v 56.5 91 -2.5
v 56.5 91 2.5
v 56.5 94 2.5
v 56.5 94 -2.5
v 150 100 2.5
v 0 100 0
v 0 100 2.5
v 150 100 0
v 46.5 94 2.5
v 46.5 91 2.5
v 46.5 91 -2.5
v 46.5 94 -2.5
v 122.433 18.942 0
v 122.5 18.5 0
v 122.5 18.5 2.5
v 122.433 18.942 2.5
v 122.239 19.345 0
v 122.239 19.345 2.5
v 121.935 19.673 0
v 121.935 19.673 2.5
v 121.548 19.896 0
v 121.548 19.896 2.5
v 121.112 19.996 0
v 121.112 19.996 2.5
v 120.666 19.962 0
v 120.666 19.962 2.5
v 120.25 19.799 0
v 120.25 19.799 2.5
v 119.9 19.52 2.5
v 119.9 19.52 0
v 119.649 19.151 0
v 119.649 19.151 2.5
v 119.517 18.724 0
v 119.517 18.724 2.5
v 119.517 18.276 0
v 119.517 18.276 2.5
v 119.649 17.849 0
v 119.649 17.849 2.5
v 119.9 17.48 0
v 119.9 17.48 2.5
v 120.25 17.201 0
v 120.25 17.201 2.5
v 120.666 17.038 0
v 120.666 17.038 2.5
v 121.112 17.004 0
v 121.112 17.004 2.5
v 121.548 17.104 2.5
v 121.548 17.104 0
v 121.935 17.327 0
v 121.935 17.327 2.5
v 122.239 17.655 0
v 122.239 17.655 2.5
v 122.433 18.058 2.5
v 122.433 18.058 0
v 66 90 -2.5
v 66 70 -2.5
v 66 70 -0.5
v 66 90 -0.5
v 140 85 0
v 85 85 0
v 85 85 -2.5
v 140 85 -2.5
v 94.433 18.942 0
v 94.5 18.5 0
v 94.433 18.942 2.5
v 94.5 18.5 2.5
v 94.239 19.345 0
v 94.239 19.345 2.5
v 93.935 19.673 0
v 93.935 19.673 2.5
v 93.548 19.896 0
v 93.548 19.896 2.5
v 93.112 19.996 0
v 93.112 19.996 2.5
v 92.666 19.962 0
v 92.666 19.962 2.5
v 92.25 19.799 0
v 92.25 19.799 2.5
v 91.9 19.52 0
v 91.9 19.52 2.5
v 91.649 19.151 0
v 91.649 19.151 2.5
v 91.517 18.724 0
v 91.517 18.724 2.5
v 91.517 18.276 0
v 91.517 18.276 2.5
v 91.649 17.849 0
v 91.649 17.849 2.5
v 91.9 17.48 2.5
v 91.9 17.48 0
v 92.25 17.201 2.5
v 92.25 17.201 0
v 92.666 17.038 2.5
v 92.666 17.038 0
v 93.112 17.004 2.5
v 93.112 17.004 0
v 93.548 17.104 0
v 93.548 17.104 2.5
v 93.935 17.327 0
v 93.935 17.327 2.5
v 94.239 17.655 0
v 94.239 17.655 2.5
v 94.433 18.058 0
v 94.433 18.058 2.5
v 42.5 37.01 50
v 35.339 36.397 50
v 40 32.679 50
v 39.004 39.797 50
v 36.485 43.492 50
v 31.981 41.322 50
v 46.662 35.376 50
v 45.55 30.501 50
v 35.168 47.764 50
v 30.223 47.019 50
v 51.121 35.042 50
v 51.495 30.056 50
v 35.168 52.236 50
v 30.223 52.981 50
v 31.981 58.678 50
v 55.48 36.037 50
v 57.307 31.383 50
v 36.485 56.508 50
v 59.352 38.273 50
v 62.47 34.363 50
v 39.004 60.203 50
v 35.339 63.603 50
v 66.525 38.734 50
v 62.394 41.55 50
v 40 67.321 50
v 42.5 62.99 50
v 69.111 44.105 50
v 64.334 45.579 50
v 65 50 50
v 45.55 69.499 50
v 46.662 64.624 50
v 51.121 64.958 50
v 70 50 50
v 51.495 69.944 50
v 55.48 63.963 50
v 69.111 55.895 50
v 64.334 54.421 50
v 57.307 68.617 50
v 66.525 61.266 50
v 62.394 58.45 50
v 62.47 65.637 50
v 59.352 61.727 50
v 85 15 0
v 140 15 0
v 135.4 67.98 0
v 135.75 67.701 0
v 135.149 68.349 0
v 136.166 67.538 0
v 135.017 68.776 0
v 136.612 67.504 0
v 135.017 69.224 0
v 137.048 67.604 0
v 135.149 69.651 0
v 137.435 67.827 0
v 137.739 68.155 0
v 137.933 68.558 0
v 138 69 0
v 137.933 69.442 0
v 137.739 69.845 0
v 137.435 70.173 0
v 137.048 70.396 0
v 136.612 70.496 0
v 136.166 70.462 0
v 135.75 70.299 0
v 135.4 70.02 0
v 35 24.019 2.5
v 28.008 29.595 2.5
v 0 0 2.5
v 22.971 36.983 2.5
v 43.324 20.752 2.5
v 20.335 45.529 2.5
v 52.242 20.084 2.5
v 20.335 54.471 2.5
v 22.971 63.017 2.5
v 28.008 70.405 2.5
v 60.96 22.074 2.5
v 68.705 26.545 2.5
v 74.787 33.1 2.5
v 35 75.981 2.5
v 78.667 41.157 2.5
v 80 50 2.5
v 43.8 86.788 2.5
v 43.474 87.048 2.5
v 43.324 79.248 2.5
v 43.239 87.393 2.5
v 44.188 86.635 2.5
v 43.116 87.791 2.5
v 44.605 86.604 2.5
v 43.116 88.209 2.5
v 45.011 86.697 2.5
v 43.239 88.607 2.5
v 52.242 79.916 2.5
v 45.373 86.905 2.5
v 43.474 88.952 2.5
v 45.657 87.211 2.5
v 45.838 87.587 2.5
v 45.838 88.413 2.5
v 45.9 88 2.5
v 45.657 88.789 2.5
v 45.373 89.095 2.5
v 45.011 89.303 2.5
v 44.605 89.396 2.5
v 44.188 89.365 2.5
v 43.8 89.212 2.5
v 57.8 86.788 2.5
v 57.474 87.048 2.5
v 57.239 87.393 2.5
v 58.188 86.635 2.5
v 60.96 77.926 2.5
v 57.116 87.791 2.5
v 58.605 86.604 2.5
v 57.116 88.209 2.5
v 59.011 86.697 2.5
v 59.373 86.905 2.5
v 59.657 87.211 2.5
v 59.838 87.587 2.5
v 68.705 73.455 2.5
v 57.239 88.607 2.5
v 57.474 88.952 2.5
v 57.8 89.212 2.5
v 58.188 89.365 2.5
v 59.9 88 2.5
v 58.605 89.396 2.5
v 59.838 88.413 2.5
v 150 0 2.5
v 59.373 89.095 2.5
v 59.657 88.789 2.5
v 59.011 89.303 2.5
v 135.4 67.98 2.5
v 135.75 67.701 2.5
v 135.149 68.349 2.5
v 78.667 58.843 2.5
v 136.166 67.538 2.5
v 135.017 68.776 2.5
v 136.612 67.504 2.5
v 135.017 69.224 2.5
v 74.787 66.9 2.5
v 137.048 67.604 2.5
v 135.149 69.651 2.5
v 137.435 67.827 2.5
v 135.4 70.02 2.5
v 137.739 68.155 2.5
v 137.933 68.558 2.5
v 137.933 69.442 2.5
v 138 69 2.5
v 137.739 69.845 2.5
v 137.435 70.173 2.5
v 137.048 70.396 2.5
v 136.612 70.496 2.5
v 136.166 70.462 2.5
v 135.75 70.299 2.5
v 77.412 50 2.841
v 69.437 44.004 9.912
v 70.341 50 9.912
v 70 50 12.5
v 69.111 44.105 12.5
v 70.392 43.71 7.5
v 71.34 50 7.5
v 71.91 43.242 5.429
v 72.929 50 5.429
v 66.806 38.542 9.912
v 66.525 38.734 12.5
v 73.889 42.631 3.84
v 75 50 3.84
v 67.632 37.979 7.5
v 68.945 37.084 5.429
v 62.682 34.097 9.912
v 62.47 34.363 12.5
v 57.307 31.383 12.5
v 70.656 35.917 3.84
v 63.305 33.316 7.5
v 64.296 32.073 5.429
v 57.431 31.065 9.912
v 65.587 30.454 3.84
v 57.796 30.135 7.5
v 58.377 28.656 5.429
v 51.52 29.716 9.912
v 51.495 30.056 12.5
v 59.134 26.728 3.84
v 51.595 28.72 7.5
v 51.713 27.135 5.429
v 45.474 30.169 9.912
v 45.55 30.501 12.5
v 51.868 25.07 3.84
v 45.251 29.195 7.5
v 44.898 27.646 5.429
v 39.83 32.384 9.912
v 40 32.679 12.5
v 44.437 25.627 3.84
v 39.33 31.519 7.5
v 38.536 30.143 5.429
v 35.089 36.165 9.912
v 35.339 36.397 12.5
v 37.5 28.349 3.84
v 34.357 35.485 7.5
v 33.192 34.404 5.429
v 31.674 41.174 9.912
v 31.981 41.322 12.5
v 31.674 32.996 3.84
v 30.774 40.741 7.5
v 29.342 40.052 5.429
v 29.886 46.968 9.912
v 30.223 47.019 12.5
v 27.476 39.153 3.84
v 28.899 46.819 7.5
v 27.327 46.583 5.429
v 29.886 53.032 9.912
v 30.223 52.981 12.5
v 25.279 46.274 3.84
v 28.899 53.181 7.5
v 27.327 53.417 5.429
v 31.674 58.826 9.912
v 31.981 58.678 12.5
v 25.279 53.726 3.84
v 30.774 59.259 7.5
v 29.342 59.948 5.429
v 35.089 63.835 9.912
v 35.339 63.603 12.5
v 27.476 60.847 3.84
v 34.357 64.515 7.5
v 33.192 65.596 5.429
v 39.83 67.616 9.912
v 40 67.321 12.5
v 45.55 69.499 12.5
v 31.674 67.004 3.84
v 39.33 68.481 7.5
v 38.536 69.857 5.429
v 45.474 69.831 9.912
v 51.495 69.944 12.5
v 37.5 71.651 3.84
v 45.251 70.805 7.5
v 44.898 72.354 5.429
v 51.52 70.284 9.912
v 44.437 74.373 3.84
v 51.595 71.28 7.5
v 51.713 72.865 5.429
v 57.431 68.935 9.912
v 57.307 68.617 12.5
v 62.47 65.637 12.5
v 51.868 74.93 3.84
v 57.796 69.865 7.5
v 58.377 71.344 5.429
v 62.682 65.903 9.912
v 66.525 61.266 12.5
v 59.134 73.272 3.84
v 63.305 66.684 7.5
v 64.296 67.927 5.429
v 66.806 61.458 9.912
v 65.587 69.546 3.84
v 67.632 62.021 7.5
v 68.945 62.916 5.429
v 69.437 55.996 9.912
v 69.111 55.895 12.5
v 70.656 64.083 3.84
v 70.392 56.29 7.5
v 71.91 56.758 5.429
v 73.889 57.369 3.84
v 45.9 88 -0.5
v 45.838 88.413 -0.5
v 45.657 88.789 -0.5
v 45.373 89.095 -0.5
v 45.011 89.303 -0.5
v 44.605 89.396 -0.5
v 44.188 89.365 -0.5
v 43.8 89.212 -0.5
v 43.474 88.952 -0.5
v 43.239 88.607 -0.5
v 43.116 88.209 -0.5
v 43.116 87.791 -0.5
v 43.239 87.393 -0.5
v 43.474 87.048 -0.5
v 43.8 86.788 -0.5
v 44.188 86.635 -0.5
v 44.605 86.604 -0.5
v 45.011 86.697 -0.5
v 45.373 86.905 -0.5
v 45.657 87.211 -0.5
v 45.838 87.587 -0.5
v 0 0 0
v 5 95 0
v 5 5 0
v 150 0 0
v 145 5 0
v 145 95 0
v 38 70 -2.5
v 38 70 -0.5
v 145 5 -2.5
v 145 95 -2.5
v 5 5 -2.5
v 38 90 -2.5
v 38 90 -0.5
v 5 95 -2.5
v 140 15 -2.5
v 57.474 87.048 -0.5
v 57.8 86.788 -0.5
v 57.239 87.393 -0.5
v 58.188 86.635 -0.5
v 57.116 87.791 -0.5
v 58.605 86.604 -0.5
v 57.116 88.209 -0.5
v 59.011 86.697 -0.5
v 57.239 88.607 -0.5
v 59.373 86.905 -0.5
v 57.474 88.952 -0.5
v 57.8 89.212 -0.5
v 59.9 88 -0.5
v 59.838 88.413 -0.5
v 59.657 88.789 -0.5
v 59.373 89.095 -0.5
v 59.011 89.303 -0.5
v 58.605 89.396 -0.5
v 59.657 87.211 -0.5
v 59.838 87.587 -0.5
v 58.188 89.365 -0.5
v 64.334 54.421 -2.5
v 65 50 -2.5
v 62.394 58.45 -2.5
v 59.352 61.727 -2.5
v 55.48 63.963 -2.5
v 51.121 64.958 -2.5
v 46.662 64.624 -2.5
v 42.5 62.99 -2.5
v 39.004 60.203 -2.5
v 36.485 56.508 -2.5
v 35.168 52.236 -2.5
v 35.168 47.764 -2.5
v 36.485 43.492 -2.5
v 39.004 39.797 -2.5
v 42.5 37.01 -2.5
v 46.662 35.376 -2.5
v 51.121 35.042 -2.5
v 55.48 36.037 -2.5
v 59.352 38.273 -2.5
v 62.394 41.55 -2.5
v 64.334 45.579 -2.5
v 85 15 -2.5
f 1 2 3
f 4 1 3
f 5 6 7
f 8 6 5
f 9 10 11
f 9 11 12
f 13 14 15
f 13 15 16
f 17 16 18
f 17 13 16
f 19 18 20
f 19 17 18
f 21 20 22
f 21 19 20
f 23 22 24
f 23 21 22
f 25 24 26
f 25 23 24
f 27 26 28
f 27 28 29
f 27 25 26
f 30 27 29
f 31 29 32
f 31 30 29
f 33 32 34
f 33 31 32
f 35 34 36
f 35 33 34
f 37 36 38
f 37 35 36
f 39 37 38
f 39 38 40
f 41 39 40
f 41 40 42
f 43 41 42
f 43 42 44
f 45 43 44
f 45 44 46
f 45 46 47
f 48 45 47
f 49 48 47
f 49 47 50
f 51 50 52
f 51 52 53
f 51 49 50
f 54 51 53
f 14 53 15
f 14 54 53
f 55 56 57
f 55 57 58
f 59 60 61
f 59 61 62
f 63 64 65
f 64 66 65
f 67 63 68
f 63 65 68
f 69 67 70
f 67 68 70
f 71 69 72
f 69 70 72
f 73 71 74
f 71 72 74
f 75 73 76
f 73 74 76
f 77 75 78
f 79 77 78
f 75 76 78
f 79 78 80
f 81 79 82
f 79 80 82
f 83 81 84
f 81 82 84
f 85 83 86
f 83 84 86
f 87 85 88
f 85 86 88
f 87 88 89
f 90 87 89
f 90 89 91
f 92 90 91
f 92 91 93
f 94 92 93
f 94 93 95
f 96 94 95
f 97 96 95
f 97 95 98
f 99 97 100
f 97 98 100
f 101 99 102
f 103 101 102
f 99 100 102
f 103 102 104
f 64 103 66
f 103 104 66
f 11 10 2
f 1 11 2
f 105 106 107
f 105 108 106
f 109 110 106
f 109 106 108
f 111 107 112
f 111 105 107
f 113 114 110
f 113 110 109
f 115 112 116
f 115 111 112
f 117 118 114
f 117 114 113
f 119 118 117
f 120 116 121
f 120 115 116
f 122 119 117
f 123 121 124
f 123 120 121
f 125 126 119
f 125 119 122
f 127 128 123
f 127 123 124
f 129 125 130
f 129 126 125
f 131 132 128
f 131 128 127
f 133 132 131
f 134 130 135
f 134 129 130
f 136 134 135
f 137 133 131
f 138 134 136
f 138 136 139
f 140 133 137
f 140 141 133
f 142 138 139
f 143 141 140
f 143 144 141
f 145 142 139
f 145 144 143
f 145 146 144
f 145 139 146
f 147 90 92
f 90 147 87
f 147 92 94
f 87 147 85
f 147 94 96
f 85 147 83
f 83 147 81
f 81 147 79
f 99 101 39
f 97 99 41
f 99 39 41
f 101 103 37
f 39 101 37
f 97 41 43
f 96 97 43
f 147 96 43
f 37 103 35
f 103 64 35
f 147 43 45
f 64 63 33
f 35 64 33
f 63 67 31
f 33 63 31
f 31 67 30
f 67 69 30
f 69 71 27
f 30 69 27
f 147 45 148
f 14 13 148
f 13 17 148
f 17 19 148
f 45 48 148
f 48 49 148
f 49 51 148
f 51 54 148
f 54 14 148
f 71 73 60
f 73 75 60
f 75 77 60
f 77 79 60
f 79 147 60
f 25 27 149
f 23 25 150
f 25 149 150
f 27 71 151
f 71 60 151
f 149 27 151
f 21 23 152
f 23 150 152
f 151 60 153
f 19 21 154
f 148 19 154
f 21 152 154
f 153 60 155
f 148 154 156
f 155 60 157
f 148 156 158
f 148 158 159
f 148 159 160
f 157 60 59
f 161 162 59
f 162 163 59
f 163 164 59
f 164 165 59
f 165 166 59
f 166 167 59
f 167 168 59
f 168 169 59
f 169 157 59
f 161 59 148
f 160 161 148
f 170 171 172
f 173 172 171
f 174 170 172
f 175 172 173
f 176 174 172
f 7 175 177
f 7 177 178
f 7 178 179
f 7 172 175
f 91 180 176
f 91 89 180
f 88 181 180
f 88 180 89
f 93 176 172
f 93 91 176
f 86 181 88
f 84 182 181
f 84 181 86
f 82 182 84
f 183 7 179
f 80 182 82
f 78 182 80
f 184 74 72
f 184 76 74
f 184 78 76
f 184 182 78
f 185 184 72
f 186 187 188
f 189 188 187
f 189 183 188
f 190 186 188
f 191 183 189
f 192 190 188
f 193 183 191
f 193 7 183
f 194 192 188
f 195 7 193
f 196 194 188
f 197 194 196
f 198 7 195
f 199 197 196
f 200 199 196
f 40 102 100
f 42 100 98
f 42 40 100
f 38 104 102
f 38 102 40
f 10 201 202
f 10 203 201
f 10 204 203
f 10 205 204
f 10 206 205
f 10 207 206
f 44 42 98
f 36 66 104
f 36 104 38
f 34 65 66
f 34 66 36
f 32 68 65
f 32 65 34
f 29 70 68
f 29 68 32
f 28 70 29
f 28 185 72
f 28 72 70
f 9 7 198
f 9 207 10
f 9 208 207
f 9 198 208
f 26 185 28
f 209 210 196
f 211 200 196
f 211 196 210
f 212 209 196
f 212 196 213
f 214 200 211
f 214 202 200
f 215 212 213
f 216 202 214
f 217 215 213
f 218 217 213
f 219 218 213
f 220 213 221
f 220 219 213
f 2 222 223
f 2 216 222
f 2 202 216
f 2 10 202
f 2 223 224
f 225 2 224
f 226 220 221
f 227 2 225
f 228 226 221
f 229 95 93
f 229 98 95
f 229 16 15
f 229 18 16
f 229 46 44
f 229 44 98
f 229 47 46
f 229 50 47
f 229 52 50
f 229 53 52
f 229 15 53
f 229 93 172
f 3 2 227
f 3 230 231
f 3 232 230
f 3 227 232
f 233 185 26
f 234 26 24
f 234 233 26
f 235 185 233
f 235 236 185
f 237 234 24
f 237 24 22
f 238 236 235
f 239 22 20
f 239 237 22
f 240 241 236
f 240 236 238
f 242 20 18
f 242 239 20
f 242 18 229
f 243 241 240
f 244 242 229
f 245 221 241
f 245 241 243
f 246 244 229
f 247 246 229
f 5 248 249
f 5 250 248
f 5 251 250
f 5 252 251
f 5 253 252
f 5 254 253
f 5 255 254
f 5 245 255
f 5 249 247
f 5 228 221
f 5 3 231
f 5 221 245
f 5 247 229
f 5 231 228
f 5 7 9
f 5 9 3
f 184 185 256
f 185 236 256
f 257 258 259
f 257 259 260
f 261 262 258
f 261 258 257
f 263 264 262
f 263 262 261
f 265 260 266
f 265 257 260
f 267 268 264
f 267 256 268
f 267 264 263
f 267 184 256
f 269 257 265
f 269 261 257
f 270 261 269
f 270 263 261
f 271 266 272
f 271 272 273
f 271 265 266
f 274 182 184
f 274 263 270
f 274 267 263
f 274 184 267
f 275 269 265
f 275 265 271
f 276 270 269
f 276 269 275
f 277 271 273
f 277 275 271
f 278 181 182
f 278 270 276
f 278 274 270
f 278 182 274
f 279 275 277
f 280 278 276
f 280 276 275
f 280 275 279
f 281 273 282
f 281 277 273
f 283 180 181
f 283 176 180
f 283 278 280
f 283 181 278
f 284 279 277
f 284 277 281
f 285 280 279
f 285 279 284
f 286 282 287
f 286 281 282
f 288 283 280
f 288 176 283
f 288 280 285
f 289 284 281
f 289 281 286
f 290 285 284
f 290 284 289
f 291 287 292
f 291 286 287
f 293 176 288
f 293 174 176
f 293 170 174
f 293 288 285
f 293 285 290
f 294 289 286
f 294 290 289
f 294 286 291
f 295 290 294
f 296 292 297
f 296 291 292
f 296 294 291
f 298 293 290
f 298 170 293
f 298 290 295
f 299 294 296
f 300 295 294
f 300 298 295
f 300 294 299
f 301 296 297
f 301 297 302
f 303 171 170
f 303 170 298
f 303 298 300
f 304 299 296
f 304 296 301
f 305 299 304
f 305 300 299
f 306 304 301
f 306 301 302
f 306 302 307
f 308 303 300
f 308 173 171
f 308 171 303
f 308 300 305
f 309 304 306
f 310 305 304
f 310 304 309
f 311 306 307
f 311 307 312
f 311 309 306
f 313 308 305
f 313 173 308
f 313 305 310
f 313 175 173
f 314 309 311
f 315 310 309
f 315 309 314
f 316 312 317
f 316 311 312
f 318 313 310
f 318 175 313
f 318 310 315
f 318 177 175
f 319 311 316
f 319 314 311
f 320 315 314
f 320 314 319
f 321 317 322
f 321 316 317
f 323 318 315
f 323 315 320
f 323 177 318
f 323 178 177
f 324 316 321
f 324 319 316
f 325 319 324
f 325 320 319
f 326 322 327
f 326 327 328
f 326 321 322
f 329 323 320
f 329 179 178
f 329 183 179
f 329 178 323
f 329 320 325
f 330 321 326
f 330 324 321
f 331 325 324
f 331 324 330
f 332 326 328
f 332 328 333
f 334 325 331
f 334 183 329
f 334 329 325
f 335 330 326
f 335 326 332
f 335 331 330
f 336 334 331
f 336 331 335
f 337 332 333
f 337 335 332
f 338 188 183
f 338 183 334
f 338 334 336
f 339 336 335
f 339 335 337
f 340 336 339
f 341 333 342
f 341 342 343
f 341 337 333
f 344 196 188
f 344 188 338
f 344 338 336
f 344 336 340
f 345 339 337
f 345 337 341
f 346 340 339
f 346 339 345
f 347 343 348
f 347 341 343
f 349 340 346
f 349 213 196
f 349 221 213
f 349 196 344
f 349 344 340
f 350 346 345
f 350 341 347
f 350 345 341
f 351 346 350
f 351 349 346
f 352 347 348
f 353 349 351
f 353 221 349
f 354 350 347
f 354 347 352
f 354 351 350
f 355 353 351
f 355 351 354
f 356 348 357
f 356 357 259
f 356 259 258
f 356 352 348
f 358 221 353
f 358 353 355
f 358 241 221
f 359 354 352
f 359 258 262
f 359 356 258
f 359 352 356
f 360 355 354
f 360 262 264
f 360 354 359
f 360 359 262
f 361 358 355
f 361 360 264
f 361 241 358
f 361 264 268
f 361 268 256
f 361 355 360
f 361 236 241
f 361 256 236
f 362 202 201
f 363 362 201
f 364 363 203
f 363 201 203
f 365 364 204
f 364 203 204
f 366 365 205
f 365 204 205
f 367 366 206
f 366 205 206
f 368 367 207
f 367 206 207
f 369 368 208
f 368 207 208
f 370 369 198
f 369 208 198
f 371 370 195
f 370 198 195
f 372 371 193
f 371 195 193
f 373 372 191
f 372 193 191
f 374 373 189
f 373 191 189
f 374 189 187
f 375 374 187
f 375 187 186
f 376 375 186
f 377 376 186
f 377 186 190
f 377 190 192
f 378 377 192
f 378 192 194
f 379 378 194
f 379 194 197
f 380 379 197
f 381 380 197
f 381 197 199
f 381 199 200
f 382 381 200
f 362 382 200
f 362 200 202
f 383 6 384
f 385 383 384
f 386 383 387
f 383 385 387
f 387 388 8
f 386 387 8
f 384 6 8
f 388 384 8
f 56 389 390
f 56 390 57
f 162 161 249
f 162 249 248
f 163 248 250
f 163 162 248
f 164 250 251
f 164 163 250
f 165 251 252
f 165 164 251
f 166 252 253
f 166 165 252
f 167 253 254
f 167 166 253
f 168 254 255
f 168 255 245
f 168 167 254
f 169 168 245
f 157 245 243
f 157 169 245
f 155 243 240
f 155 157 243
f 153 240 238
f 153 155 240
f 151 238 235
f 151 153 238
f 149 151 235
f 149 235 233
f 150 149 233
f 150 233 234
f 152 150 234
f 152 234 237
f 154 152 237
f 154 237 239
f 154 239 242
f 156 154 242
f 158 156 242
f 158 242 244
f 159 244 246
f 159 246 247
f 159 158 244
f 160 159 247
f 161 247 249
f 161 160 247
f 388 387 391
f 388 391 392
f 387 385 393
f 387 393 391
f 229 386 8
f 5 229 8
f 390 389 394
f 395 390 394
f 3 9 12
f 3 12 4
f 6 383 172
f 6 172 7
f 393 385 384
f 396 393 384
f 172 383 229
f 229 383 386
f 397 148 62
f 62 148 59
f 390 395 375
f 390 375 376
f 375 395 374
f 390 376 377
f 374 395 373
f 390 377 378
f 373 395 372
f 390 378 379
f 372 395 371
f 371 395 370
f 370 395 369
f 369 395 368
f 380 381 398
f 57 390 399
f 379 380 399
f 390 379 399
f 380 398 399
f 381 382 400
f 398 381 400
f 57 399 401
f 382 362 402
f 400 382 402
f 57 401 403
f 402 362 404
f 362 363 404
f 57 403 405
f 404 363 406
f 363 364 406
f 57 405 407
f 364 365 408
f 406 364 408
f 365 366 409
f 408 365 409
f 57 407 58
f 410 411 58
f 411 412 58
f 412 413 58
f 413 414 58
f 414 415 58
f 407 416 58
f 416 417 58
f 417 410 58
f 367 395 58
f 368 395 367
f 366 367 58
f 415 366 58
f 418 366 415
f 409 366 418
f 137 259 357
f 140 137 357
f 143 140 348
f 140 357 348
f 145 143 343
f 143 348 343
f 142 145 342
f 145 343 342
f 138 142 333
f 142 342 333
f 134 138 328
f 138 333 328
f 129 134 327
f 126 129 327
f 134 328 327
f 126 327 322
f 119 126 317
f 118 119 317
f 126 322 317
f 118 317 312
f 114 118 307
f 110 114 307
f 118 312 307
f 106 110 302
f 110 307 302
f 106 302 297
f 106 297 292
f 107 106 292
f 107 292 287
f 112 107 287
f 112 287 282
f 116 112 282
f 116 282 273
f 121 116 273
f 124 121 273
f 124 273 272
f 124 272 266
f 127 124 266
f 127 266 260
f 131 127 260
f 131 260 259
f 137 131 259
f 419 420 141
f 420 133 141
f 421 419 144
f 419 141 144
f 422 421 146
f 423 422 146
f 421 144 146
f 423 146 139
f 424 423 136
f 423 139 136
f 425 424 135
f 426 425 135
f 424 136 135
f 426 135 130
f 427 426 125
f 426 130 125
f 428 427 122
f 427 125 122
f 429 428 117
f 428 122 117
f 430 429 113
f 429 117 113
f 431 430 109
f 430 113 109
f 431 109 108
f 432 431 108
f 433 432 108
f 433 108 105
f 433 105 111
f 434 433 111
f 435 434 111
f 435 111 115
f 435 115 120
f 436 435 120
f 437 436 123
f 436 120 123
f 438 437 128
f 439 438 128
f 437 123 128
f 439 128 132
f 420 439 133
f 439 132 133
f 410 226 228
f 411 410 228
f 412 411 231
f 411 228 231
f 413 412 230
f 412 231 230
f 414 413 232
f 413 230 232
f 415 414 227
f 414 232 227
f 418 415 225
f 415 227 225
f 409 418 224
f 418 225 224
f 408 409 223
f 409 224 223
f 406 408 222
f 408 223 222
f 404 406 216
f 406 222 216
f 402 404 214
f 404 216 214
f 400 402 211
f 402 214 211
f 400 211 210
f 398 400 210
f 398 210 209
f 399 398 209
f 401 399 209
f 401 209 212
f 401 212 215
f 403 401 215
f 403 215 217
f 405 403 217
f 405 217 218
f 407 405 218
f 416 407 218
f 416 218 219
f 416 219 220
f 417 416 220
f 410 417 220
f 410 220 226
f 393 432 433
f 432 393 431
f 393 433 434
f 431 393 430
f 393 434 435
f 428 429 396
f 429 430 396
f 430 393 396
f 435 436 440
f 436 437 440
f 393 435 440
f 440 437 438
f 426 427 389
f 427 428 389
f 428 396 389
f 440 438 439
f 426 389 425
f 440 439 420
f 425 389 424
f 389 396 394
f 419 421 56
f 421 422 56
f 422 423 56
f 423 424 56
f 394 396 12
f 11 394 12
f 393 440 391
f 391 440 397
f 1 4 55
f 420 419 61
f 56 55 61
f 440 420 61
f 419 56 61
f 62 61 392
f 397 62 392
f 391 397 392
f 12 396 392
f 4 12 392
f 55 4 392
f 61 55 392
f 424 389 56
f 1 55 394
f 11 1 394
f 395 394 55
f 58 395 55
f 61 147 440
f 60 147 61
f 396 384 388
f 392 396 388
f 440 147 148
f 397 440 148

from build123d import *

# Parameters (mm, degrees)
SKETCH020_W     = 150
SKETCH020_H     = 100
PAD009_DEPTH    = 2.5
SKETCH005_W     = 140
SKETCH005_H     = 90
PAD010_DEPTH    = 2.5
SKETCH021_R     = 20
PAD002_DEPTH    = 50
SKETCH019_R     = 15
POCKET010_DEPTH = 50
SKETCH003_W     = 55
SKETCH003_H     = 70
POCKET001_DEPTH = 3
SKETCH004_R     = 1.5
POCKET002_DEPTH = 2.5
SKETCH006_W     = 28
SKETCH006_H     = 20
POCKET003_DEPTH = 2
SKETCH007_R     = 1.4
SKETCH007_W     = 10
SKETCH007_H     = 3
POCKET004_DEPTH = 50
FILLET_R        = 10


with BuildPart() as part:
    # Sketch020 → Pad009 (new body)
    with BuildSketch(Plane.XY):
        with Locations((75, 50)):
            Rectangle(SKETCH020_W, SKETCH020_H)
    extrude(amount=PAD009_DEPTH)

    # Sketch005 → Pad010 (join)
    with BuildSketch(Plane.XY):
        with Locations((75, 50)):
            Rectangle(SKETCH005_W, SKETCH005_H)
    extrude(amount=-PAD010_DEPTH)

    # Sketch021 → Pad002 (join)
    with BuildSketch(Plane.XY):
        with Locations((50, 50)):
            Circle(SKETCH021_R)
    extrude(amount=PAD002_DEPTH)

    # Sketch019 → Pocket010 (cut, symmetric)
    with BuildSketch(Plane.XY):
        with Locations((50, 50)):
            Circle(SKETCH019_R)
    extrude(amount=POCKET010_DEPTH, both=True, mode=Mode.SUBTRACT)

    # Sketch003 → Pocket001 (cut)
    with BuildSketch(Plane.XY):
        with Locations((112.5, 50)):
            Rectangle(SKETCH003_W, SKETCH003_H)
    extrude(amount=-POCKET001_DEPTH, mode=Mode.SUBTRACT)

    # Sketch004 → Pocket002 (cut, symmetric)
    with BuildSketch(Plane.XY):
        with Locations((121, 18.5)):
            Circle(SKETCH004_R)
        with Locations((136.5, 69)):
            Circle(SKETCH004_R)
        with Locations((93, 18.5)):
            Circle(SKETCH004_R)
    extrude(amount=POCKET002_DEPTH, both=True, mode=Mode.SUBTRACT)

    # Sketch006 → Pocket003 (cut)
    with BuildSketch(Plane.XY.offset(-2.5)):
        with Locations((52, 80)):
            Rectangle(SKETCH006_W, SKETCH006_H)
    extrude(amount=POCKET003_DEPTH, mode=Mode.SUBTRACT)

    # Sketch007 → Pocket004 (cut, symmetric)
    with BuildSketch(Plane.XY.offset(5.5)):
        with Locations((44.5, 88)):
            Circle(SKETCH007_R)
        with Locations((58.5, 88)):
            Circle(SKETCH007_R)
        with Locations((51.5, 92.5)):
            Rectangle(SKETCH007_W, SKETCH007_H)
    extrude(amount=POCKET004_DEPTH, both=True, mode=Mode.SUBTRACT)

    # Fillet
    fillet_edges = [part.edges().sort_by_distance(p)[0] for p in [
        (30, 50, 2.5),
    ]]
    fillet(fillet_edges, radius=FILLET_R)


solid = part.part
